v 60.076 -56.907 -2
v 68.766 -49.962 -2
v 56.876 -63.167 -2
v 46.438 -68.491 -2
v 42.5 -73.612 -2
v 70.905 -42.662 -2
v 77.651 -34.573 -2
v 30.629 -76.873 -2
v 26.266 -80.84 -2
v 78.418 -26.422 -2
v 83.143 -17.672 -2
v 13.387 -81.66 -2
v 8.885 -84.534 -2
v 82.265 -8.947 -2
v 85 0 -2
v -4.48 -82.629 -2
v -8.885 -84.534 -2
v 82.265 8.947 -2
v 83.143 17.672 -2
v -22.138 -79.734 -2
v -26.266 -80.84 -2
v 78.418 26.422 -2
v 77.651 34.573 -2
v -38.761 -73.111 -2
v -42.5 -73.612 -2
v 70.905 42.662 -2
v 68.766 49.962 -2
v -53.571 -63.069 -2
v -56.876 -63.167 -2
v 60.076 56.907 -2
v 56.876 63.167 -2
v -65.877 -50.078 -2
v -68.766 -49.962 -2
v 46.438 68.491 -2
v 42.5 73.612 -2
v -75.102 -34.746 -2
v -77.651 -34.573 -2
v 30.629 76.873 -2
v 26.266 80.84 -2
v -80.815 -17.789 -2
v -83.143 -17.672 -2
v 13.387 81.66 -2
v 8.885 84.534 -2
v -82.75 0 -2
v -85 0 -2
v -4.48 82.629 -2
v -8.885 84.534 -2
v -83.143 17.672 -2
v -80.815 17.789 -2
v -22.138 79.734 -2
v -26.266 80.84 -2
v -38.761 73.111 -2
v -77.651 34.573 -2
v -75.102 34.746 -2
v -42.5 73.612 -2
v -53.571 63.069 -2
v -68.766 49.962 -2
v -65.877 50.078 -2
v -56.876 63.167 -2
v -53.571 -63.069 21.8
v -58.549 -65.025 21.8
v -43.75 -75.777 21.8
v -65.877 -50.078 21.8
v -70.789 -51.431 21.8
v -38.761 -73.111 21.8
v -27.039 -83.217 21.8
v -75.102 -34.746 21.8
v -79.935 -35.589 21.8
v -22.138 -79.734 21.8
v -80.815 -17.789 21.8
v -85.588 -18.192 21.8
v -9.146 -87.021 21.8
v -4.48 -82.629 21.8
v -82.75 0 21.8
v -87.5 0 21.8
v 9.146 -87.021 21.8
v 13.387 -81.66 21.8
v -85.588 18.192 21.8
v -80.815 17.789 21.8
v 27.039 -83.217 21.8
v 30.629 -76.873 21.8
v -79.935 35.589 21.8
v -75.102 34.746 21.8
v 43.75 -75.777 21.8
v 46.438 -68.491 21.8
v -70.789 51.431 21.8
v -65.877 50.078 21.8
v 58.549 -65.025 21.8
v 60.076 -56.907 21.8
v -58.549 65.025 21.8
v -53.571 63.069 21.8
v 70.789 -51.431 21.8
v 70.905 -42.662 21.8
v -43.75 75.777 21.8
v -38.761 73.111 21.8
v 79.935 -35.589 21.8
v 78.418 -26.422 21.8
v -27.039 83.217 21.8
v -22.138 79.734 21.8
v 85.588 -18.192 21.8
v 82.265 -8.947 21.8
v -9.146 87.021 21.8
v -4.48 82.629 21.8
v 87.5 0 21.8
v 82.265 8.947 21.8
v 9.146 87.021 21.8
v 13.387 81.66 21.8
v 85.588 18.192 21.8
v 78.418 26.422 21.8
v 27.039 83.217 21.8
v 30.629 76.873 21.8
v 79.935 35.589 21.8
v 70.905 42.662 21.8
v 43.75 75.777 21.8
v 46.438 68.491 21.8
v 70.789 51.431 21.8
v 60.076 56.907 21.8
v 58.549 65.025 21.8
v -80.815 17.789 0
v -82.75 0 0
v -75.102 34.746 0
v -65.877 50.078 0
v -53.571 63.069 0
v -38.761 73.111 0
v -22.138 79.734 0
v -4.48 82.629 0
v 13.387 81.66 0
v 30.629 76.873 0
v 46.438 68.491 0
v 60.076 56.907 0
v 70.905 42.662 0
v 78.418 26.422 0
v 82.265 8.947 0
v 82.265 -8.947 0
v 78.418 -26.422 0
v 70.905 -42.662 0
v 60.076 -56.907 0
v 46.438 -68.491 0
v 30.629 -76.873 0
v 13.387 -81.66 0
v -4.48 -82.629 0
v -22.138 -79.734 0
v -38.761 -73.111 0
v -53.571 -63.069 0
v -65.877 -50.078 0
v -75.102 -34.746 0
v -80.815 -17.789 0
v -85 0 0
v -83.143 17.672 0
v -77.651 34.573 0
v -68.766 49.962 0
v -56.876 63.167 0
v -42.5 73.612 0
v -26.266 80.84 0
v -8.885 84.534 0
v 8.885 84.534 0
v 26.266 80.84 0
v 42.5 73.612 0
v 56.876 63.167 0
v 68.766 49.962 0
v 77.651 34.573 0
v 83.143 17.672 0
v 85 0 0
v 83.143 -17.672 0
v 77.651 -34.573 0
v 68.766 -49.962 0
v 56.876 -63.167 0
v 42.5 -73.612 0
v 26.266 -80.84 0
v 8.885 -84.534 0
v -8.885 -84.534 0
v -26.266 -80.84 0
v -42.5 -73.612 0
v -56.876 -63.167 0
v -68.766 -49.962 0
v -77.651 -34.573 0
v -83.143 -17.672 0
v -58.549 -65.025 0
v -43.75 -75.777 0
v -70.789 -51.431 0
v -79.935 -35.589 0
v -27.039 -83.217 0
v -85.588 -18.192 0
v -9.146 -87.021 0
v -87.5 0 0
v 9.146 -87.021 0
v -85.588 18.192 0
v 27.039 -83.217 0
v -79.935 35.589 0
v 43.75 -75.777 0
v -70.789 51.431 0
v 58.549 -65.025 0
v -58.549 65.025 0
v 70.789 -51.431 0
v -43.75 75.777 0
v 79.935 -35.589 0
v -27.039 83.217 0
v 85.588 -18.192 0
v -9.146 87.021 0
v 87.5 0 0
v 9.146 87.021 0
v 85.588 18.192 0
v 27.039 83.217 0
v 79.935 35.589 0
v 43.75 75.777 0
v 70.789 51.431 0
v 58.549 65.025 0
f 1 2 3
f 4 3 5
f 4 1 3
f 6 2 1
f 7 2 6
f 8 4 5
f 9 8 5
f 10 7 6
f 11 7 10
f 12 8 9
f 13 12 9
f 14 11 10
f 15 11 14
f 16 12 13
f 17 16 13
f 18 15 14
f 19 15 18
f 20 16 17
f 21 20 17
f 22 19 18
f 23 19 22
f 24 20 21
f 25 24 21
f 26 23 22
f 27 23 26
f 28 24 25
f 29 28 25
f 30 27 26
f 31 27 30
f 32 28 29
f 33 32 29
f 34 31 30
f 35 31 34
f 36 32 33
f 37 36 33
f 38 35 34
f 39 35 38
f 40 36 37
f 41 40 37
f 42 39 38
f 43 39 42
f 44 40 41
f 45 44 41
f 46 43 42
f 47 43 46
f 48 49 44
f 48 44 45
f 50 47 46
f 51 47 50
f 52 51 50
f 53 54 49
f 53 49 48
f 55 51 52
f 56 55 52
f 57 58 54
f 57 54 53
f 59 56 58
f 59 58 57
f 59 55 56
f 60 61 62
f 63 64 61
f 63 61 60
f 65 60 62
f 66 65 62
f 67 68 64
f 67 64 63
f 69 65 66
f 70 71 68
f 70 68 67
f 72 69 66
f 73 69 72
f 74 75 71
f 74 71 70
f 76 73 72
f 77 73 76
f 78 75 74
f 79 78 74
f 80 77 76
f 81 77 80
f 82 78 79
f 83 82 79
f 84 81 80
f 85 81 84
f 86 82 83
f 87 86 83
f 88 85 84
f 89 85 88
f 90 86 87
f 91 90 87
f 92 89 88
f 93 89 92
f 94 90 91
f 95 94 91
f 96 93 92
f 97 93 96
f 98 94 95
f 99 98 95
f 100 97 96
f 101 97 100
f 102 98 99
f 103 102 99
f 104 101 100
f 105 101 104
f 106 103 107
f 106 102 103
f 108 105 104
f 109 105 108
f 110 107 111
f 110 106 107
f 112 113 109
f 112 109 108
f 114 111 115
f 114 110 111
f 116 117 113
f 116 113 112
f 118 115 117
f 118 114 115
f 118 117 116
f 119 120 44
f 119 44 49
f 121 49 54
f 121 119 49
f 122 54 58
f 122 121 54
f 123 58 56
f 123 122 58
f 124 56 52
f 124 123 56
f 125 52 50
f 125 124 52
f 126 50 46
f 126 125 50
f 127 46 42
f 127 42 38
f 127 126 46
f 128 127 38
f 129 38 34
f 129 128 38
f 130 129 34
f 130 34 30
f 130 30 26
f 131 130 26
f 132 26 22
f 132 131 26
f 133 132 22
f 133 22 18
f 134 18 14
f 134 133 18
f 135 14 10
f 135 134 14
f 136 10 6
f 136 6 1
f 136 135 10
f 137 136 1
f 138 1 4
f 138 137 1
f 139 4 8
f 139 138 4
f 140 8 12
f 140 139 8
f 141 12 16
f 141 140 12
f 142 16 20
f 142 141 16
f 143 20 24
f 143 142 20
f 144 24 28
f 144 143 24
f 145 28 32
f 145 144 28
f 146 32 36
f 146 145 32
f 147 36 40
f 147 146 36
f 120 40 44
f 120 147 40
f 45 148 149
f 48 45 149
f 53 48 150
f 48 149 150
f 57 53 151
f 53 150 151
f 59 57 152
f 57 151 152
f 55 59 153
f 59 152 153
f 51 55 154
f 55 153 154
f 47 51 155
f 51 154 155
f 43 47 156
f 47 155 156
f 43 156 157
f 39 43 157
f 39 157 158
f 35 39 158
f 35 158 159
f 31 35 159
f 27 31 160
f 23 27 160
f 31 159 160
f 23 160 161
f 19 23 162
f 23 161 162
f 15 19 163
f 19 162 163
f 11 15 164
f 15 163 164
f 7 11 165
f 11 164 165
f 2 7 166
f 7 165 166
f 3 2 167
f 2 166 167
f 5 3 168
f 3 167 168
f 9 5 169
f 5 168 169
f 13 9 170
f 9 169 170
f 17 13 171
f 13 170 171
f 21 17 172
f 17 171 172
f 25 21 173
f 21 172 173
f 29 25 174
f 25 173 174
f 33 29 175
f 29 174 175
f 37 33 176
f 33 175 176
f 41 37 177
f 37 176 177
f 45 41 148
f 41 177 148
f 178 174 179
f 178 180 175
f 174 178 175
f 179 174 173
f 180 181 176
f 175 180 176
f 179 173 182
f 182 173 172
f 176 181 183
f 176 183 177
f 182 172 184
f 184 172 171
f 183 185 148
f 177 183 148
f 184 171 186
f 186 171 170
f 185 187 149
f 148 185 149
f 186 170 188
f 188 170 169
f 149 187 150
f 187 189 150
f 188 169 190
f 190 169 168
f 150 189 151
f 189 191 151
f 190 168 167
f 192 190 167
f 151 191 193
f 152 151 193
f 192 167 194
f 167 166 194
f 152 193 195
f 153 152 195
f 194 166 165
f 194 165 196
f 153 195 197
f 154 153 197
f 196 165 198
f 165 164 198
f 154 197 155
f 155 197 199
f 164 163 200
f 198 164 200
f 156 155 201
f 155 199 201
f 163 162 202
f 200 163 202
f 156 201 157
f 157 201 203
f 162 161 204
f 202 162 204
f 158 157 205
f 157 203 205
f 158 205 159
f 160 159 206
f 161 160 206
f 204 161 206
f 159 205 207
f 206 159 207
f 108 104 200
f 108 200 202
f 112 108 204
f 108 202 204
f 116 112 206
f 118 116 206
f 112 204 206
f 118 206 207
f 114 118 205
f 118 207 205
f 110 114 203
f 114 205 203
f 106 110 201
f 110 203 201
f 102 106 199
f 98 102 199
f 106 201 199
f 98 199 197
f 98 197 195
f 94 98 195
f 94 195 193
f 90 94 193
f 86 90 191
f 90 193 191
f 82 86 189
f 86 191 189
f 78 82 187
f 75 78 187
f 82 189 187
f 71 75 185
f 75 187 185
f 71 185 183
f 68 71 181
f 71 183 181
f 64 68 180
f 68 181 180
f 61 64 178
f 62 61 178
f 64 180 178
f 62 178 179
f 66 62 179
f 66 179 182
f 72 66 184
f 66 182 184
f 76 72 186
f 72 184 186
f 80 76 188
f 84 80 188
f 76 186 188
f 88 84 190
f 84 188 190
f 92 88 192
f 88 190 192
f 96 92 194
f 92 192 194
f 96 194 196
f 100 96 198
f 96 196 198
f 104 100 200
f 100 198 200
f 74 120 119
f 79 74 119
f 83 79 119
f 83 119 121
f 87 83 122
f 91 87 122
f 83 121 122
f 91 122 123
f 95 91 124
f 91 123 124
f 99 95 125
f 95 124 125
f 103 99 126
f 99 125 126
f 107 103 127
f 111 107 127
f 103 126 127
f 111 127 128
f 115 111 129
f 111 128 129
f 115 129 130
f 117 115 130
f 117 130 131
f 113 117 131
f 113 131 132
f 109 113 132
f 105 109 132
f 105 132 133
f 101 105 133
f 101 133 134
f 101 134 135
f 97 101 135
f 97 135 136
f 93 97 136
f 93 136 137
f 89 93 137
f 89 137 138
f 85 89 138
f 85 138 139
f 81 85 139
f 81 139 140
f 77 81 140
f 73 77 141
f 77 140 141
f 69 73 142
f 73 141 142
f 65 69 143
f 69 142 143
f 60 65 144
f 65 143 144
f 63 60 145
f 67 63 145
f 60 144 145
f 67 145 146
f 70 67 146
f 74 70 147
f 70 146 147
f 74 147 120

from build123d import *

# Parameters (mm, degrees)
SKETCH1_R                       = 87.5
SKETCH1_R_2                     = 83.75
BOSS_EXTRUDE1_DEPTH             = 21.8
SKETCH2_R                       = 85
SKETCH2_R_2                     = 82.75
BOSS_EXTRUDE2_DEPTH             = 2
BOSS_EXTRUDE2_DIRECTION_2_REACH = 127.649


with BuildPart() as part:
    # Sketch1 → Boss-Extrude1 (new body)
    with BuildSketch(Plane.XY):
        Circle(SKETCH1_R)
        Circle(SKETCH1_R_2, mode=Mode.SUBTRACT)
    extrude(amount=BOSS_EXTRUDE1_DEPTH)

    # Sketch2 → Boss-Extrude2 (add)
    with BuildSketch(Plane(origin=(0, 0, 0), x_dir=(-1, 0, 0), z_dir=(0, 0, -1))):
        Circle(SKETCH2_R)
        Circle(SKETCH2_R_2, mode=Mode.SUBTRACT)
    extrude(amount=BOSS_EXTRUDE2_DEPTH)

    # Boss-Extrude2 direction 2: up to this face of the body (flat: up to its plane)
    boss_extrude2_direction_2_end = Plane(part.part.faces().sort_by_distance((-85.025126266, 0, 21.8))[0])
    # Sketch2 → Boss-Extrude2 direction 2 (add, up to the picked face)
    with BuildSketch(Plane(origin=(0, 0, 0), x_dir=(-1, 0, 0), z_dir=(0, 0, -1)), mode=Mode.PRIVATE) as boss_extrude2_direction_2_sk1:
        Circle(SKETCH2_R)
        Circle(SKETCH2_R_2, mode=Mode.SUBTRACT)
    boss_extrude2_direction_2_tool1 = split(extrude(boss_extrude2_direction_2_sk1.sketch, amount=-BOSS_EXTRUDE2_DIRECTION_2_REACH, mode=Mode.PRIVATE), bisect_by=boss_extrude2_direction_2_end, keep=Keep.BOTH, mode=Mode.PRIVATE)
    add(boss_extrude2_direction_2_tool1.solids().sort_by(Axis((84.759584, 0, 0), (0, 0, 1)))[0])


solid = part.part
